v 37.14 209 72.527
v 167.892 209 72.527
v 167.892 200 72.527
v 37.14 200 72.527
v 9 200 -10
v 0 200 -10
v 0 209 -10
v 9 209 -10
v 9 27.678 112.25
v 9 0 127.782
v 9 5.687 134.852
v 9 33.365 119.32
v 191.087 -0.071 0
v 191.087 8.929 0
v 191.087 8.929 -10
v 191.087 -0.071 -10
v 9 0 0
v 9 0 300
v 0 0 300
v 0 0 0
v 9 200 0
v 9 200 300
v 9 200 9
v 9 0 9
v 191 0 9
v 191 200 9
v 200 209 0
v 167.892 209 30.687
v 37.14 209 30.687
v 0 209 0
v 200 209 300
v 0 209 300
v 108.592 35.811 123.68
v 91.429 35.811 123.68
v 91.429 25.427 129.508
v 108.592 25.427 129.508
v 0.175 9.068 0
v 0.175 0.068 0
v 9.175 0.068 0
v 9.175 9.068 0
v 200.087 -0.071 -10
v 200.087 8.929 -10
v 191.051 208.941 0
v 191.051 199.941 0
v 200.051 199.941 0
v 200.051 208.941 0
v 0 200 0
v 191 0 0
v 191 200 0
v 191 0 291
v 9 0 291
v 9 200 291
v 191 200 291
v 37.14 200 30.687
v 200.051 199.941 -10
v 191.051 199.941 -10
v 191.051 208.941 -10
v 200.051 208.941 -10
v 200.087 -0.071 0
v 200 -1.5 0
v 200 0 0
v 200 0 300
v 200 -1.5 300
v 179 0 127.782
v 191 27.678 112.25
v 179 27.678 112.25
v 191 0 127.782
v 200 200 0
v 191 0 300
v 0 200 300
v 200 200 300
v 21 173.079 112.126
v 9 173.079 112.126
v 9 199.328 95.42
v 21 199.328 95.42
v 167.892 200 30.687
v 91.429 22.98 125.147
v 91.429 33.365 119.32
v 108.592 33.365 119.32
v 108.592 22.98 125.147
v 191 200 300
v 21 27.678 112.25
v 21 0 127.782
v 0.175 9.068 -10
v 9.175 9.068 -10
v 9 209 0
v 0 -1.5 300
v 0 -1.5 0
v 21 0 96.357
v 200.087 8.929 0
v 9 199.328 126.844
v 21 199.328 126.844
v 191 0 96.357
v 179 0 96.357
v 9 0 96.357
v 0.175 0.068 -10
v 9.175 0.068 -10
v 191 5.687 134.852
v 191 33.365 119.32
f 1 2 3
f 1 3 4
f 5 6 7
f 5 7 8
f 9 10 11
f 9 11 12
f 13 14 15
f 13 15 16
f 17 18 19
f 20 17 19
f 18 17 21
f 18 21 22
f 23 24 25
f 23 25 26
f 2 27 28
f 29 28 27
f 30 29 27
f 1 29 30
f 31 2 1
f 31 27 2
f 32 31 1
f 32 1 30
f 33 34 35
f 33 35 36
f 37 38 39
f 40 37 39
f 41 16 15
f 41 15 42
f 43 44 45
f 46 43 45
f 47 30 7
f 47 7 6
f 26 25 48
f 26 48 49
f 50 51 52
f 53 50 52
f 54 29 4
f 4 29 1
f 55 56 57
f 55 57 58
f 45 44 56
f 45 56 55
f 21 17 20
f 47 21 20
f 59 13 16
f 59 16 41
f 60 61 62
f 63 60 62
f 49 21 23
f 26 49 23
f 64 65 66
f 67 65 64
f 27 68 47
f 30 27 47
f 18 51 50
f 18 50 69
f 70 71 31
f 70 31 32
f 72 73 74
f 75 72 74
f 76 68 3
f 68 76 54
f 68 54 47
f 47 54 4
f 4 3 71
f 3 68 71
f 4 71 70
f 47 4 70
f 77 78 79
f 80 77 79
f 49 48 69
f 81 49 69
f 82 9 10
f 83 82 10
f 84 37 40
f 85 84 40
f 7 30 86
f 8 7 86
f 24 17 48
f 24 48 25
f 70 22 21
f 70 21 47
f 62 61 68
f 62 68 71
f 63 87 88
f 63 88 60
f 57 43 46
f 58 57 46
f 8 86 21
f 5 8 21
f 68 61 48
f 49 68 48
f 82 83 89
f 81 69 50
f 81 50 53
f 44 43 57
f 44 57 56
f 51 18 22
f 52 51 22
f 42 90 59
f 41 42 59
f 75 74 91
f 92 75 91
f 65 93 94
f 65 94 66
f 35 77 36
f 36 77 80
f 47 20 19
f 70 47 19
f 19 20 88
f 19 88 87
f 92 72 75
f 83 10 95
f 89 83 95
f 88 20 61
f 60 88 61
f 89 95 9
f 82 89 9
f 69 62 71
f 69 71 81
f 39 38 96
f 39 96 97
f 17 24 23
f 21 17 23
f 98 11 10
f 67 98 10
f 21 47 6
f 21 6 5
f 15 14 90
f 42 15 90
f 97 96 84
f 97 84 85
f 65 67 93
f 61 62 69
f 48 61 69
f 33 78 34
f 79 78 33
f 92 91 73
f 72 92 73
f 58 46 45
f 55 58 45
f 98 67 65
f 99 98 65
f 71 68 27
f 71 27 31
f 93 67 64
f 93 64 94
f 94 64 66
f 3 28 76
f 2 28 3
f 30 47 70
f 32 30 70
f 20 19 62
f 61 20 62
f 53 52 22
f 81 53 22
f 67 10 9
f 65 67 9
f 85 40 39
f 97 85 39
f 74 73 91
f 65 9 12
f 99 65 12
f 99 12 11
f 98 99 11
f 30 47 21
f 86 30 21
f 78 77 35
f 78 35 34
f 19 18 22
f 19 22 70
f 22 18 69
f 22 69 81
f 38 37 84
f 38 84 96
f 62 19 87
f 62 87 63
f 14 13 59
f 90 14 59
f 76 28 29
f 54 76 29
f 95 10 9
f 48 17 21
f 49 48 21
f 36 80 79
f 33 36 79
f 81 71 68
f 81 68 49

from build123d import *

# Parameters (mm, degrees)
F0_W      = 200
F0_H      = 300
F1_DEPTH  = 1.5
F2_W      = 9
F2_H      = 300
F3_DEPTH  = 200
F5_DEPTH  = 12
F7_DEPTH  = 182
F8_W      = 17.163492
F8_H      = 11.907444
F9_DEPTH  = 5
F11_DEPTH = 12
F12_W     = 200
F12_H     = 9
F13_DEPTH = 182
F14_W     = 200
F14_H     = 9
F15_DEPTH = 182
F16_W     = 9
F16_H     = 300
F17_DEPTH = 200
F18_W     = 200
F18_H     = 300
F19_DEPTH = 9
F20_W     = 9
F20_H     = 9
F21_DEPTH = 10
F22_W     = 130.7519
F22_H     = 41.840611
F23_DEPTH = 9


with BuildPart() as f1:
    # F0 (on Front) → F1 (new body)
    with BuildSketch(Plane.XZ):
        with Locations((100, 150)):
            Rectangle(F0_W, F0_H)
    extrude(amount=F1_DEPTH)


with BuildPart() as f3:
    # F2 (on face) → F3 (new body)
    with BuildSketch(Plane(origin=(0, 0, 0), x_dir=(-1, 0, 0), z_dir=(0, 1, 0))):
        with Locations((-4.5, 150)):
            Rectangle(F2_W, F2_H)
    extrude(amount=F3_DEPTH)


with BuildPart() as f5:
    # F4 (on face) → F5 (new body)
    with BuildSketch(Plane.YZ.offset(9)):
        Polygon((0, 127.78157), (0, 96.357256), (27.67759, 112.250008), align=None)
        Polygon((173.078761, 112.126425), (199.328241, 95.420043), (199.328241, 126.844356), align=None)
    extrude(amount=F5_DEPTH)


with BuildPart() as f7:
    # F6 (on face) → F7 (new body)
    with BuildSketch(Plane.YZ.offset(9)):
        Polygon((0, 127.78157), (27.67759, 112.250008), (33.364529, 119.320042), (5.686939, 134.851605), align=None)
    extrude(amount=F7_DEPTH)


with BuildPart() as f9:
    # F8 (on face) → F9 (new body)
    with BuildSketch(Plane(origin=(0, 58.912564, 104.983502), x_dir=(1, 0, 0), z_dir=(0, 0.489373, 0.872074))):
        with Locations((100.010585, -35.24943)):
            Rectangle(F8_W, F8_H)
    extrude(amount=F9_DEPTH)


with BuildPart() as f11:
    # F10 (on face) → F11 (new body)
    with BuildSketch(Plane.YZ.offset(191)):
        Polygon((0, 127.78157), (0, 96.357256), (27.67759, 112.250008), align=None)
    extrude(amount=-F11_DEPTH)


with BuildPart() as f13:
    # F12 (on face) → F13 (new body)
    with BuildSketch(Plane.YZ.offset(9)):
        with Locations((100, 295.5)):
            Rectangle(F12_W, F12_H)
    extrude(amount=F13_DEPTH)


with BuildPart() as f15:
    # F14 (on face) → F15 (new body)
    with BuildSketch(Plane.YZ.offset(9)):
        with Locations((100, 4.5)):
            Rectangle(F14_W, F14_H)
    extrude(amount=F15_DEPTH)


with BuildPart() as f17:
    # F16 (on face) → F17 (new body)
    with BuildSketch(Plane(origin=(0, 0, 0), x_dir=(-1, 0, 0), z_dir=(0, 1, 0))):
        with Locations((-195.5, 150)):
            Rectangle(F16_W, F16_H)
    extrude(amount=F17_DEPTH)


with BuildPart() as f19:
    # F18 (on face) → F19 (new body)
    with BuildSketch(Plane(origin=(0, 200, 0), x_dir=(-1, 0, 0), z_dir=(0, 1, 0))):
        with Locations((-100, 150)):
            Rectangle(F18_W, F18_H)
    extrude(amount=F19_DEPTH)

    # F22 (on face) → F23 (cut)
    with BuildSketch(Plane(origin=(0, 209, 0), x_dir=(-1, 0, 0), z_dir=(0, 1, 0))):
        with Locations((-102.516074, 51.606977)):
            Rectangle(F22_W, F22_H)
    extrude(amount=-F23_DEPTH, mode=Mode.SUBTRACT)


with BuildPart() as f21:
    # F20 (on face) → F21 (new body)
    with BuildSketch(Plane(origin=(0, 0, 0), x_dir=(1, 0, 0), z_dir=(0, 0, -1))):
        with Locations((4.5, -204.5)):
            Rectangle(F20_W, F20_H)
        with Locations((195.550859, -204.440638)):
            Rectangle(F20_W, F20_H)
        with Locations((195.586695, -4.428624)):
            Rectangle(F20_W, F20_H)
        with Locations((4.674674, -4.567612)):
            Rectangle(F20_W, F20_H)
    extrude(amount=F21_DEPTH)


solid = Compound([f1.part, f3.part, f5.part, f7.part, f9.part, f11.part, f13.part, f15.part, f17.part, f19.part, f21.part])
